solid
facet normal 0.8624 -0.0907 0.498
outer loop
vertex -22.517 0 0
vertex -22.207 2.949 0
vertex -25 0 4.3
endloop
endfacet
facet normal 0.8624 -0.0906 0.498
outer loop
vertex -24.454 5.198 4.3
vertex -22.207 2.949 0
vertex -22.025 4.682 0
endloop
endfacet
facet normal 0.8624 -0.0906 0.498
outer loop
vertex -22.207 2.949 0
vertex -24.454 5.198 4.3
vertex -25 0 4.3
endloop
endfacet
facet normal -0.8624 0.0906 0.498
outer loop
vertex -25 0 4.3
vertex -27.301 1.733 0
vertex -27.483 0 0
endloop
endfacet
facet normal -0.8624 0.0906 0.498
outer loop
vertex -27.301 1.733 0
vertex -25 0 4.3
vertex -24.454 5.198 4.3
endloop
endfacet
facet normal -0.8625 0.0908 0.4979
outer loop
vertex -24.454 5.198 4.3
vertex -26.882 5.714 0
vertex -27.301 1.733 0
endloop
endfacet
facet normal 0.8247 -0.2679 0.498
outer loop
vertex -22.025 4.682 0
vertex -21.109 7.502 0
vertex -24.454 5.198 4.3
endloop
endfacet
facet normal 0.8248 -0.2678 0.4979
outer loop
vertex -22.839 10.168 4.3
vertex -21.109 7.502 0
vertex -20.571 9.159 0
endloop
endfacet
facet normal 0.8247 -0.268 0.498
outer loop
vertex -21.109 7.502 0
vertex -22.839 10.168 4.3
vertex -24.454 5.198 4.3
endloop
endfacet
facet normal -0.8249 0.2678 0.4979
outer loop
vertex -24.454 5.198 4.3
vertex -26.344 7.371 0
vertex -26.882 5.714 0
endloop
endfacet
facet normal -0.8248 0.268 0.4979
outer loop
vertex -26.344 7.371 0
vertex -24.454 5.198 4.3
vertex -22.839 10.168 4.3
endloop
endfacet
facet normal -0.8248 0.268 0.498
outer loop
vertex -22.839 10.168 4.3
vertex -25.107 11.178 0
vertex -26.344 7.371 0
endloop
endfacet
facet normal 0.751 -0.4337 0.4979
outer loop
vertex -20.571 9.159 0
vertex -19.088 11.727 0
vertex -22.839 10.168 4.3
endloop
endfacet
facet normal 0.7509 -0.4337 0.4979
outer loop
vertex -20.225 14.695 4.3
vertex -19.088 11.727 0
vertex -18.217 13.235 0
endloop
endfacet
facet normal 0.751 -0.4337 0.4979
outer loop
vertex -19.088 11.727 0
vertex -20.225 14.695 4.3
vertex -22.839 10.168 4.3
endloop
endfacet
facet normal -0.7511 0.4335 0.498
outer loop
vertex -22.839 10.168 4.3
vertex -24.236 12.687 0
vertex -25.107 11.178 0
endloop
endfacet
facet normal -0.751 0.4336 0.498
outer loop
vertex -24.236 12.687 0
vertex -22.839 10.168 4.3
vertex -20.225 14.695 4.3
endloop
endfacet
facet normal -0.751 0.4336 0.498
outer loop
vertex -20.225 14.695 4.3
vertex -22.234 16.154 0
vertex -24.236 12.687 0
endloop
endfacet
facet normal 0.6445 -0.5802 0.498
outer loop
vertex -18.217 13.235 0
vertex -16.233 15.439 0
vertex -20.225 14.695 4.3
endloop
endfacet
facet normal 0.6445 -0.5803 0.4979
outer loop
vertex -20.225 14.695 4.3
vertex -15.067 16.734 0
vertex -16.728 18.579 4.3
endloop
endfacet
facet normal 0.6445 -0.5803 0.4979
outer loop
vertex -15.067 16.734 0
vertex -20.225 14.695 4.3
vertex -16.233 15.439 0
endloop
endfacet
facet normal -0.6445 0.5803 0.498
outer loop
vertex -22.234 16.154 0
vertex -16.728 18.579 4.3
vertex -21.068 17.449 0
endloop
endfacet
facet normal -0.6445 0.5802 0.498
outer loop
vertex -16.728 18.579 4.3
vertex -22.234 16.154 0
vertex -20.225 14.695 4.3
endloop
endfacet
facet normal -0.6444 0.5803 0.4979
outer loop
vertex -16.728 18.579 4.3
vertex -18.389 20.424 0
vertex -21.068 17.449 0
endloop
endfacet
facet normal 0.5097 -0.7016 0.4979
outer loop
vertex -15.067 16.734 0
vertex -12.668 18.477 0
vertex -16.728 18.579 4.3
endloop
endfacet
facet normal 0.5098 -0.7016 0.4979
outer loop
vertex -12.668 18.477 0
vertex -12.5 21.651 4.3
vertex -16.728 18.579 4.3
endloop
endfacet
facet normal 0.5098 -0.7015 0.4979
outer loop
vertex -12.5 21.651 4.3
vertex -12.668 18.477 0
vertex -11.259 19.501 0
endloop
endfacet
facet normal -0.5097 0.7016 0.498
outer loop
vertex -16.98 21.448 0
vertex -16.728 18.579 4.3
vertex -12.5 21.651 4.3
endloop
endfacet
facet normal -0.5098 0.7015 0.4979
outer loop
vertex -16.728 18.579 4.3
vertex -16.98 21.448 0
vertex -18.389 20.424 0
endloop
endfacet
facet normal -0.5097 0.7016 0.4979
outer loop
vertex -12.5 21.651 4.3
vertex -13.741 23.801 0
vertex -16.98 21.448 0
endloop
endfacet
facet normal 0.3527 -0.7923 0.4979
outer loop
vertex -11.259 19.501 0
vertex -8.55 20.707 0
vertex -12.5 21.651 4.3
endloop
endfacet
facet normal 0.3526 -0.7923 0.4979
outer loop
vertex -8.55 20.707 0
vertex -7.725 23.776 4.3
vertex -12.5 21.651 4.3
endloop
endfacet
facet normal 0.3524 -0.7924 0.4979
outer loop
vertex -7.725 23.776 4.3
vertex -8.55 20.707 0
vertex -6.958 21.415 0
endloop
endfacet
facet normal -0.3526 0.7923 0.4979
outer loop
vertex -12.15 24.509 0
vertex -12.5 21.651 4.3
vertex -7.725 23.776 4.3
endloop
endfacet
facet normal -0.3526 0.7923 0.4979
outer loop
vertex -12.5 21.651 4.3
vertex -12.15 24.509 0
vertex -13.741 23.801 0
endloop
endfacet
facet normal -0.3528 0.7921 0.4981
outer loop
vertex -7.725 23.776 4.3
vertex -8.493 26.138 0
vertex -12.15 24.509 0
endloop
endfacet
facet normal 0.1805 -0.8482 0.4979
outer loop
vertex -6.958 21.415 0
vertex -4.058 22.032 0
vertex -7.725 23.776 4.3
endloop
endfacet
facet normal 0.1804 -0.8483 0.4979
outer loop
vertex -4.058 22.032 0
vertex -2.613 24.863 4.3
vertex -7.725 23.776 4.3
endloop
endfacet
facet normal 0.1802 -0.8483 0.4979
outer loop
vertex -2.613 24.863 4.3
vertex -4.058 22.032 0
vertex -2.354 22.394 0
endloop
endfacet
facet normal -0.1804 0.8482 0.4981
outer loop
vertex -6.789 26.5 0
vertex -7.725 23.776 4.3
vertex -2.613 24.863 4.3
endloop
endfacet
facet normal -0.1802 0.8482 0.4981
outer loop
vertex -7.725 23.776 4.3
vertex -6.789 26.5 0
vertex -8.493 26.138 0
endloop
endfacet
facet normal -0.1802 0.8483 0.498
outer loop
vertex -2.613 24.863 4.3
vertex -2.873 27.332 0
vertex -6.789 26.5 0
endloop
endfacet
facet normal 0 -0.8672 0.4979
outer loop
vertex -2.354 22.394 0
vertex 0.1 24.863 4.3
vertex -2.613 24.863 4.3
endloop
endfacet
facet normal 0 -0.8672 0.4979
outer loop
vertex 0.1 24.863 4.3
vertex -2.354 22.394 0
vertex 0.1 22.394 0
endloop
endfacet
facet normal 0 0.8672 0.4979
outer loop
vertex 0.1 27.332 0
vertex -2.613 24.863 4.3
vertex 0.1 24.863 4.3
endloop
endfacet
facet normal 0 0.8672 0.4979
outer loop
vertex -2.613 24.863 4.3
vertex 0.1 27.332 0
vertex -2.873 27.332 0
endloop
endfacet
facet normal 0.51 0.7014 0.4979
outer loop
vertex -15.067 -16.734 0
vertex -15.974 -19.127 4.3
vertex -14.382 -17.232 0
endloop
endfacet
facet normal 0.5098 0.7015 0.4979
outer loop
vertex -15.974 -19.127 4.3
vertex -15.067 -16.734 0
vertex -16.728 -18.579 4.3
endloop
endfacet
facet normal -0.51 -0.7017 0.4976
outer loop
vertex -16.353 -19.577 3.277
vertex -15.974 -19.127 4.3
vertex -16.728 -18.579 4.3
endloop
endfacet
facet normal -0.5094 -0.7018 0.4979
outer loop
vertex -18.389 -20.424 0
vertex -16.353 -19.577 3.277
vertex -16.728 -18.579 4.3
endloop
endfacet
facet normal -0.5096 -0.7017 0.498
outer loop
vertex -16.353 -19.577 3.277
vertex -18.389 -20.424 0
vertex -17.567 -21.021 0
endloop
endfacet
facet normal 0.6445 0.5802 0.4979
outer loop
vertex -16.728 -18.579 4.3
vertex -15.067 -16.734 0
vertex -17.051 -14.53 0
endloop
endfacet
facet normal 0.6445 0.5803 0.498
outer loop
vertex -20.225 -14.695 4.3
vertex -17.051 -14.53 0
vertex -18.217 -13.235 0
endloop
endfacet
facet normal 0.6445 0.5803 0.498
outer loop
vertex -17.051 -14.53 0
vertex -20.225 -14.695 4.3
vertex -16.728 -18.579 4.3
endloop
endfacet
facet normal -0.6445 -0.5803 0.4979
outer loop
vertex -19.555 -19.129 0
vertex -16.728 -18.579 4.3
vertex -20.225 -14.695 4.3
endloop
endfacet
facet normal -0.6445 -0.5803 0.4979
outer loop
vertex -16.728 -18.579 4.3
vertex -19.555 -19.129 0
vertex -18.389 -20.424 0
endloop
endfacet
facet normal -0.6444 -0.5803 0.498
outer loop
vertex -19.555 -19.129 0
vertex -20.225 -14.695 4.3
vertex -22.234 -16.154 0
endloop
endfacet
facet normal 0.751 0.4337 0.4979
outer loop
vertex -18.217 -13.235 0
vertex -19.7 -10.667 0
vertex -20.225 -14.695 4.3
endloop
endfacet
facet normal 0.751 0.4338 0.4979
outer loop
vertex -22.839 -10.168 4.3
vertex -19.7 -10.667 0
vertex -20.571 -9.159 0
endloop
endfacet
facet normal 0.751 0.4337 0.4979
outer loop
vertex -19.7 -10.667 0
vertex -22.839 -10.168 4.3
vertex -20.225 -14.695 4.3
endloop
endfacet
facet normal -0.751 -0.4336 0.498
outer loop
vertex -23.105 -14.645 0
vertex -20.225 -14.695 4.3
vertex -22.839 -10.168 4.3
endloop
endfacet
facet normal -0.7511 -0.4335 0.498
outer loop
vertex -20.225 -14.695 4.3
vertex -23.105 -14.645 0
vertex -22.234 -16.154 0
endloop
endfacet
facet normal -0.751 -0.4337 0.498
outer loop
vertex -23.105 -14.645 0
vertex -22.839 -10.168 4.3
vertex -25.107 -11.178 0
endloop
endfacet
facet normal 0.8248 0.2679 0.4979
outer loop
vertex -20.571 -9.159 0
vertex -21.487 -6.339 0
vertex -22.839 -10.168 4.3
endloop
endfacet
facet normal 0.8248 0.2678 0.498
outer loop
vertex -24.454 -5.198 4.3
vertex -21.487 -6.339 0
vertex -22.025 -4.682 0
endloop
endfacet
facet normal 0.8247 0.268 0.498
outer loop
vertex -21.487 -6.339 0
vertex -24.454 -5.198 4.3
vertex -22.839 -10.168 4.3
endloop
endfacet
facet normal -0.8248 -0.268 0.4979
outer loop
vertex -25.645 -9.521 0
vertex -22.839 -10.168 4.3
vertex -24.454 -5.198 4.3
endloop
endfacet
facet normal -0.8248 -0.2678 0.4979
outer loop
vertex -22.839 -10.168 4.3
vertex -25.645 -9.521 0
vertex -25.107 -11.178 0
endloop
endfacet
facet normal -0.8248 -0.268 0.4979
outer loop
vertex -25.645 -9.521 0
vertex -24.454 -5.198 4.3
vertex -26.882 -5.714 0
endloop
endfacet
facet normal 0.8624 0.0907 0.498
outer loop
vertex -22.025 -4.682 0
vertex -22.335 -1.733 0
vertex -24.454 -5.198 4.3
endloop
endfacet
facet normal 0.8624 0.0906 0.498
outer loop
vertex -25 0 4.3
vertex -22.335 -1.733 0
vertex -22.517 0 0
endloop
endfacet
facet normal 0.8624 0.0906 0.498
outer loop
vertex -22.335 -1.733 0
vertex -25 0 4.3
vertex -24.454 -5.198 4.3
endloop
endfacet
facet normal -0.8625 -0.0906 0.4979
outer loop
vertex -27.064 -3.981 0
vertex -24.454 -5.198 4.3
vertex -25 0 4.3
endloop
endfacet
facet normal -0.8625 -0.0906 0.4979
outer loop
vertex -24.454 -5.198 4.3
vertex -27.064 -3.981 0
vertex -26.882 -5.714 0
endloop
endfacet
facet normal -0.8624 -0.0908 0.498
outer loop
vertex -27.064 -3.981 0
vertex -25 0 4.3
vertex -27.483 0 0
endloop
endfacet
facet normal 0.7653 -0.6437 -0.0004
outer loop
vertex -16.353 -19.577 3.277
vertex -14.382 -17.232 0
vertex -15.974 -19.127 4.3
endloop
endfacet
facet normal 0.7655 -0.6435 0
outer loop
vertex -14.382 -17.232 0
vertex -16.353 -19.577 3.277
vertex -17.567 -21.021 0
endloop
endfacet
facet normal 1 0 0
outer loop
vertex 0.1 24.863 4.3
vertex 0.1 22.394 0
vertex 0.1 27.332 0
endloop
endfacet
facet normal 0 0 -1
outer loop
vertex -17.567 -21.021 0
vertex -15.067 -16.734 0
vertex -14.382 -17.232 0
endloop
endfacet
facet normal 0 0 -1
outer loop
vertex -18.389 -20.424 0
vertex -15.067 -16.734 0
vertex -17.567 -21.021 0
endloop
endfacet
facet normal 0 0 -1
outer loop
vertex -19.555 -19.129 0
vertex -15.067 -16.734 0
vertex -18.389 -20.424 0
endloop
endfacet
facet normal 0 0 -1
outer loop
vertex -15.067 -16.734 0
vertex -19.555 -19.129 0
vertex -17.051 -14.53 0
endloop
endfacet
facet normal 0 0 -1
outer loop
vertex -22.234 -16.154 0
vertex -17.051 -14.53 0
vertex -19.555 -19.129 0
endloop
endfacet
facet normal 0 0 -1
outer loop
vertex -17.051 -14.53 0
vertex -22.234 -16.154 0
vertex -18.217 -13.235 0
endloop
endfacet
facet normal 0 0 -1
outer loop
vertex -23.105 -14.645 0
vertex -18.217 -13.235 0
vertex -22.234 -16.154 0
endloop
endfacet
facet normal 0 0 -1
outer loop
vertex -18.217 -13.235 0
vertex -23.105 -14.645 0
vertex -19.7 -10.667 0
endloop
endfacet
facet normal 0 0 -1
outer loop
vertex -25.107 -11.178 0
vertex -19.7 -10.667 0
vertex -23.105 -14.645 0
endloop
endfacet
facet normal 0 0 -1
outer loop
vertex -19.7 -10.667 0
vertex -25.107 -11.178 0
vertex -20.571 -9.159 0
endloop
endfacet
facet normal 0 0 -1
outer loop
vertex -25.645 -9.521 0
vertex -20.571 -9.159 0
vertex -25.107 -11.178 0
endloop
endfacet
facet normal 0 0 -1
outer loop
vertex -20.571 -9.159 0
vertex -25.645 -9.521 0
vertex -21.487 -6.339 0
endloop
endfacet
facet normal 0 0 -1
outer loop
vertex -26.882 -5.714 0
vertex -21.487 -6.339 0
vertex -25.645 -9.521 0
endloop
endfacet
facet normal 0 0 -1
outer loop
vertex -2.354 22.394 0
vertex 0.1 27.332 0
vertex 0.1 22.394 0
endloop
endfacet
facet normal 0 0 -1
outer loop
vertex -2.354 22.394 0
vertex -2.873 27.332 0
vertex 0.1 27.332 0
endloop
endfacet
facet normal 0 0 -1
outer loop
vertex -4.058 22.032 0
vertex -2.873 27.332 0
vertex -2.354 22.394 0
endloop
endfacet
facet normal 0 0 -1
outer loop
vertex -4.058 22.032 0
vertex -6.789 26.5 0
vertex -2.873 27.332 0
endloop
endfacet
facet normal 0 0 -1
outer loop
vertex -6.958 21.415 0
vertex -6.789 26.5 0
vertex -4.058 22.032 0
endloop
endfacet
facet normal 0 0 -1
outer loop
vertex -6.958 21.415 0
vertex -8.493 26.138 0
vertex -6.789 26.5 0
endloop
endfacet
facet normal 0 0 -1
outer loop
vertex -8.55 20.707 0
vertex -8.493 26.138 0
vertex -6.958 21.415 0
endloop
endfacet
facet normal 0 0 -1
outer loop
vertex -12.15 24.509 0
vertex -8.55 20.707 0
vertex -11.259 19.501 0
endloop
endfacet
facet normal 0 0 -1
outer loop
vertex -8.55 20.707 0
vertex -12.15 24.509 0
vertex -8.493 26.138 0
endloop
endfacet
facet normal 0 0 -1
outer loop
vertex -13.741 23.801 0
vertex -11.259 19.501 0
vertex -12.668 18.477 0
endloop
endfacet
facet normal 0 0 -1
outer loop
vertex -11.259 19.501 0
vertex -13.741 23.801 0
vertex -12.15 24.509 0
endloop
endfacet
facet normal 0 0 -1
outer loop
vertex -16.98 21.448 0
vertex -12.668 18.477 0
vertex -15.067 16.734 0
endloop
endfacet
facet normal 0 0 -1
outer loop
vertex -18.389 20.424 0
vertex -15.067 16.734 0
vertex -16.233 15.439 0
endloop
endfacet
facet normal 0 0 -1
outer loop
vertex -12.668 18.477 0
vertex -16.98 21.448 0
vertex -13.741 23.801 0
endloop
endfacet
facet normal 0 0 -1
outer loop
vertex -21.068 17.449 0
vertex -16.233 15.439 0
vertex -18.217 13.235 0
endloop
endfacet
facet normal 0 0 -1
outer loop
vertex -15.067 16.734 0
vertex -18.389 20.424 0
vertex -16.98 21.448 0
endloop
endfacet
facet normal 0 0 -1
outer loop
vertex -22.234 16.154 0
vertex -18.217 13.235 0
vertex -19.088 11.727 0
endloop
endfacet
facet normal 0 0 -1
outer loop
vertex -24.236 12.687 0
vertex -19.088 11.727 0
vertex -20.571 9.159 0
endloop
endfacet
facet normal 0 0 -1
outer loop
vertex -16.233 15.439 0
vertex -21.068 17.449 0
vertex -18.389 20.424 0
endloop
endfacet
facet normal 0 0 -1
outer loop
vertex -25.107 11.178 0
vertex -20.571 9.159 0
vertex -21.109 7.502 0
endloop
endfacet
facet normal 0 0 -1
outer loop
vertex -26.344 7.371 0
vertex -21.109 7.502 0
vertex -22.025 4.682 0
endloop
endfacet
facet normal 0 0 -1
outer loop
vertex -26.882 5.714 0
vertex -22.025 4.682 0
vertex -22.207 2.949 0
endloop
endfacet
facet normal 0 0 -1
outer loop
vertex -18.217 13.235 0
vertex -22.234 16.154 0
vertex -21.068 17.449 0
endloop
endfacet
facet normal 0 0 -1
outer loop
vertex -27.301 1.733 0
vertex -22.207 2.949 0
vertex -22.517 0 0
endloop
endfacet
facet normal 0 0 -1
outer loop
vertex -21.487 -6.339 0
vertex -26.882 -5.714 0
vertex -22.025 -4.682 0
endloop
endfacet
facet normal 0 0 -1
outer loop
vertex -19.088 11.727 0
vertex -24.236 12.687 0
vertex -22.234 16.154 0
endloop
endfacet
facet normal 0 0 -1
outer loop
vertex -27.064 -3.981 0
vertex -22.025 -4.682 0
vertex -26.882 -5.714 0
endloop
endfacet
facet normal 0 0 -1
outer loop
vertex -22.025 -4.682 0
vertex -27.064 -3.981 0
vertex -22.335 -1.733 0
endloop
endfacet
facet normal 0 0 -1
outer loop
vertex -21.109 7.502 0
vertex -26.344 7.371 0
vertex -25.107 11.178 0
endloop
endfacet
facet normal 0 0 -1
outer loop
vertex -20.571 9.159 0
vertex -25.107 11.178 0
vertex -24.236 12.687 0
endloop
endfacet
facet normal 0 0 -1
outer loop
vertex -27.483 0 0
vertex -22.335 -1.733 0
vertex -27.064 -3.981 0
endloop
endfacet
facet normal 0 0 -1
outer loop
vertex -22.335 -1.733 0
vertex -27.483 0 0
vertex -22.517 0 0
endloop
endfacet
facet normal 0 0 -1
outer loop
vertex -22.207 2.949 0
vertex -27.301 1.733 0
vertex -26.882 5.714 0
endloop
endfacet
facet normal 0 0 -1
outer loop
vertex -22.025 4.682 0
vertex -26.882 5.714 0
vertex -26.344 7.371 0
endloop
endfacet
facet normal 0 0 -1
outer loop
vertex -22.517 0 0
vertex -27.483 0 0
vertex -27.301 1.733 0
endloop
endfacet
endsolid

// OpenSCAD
intersection()
{
    rotate_extrude()
    {
        translate([25,0,0]) triangle(4.3);
    }
    hull()
    {
        rotate(0) cube([0.1,100,100]);
        rotate(140) cube([0.1,100,100]);
    }
}



module triangle(radius)
{
  o=radius/2;
  a=radius*sqrt(3)/2;
  polygon(points=[[-a,-o],[0,radius],[a,-o]],paths=[[0,1,2]]);
}
